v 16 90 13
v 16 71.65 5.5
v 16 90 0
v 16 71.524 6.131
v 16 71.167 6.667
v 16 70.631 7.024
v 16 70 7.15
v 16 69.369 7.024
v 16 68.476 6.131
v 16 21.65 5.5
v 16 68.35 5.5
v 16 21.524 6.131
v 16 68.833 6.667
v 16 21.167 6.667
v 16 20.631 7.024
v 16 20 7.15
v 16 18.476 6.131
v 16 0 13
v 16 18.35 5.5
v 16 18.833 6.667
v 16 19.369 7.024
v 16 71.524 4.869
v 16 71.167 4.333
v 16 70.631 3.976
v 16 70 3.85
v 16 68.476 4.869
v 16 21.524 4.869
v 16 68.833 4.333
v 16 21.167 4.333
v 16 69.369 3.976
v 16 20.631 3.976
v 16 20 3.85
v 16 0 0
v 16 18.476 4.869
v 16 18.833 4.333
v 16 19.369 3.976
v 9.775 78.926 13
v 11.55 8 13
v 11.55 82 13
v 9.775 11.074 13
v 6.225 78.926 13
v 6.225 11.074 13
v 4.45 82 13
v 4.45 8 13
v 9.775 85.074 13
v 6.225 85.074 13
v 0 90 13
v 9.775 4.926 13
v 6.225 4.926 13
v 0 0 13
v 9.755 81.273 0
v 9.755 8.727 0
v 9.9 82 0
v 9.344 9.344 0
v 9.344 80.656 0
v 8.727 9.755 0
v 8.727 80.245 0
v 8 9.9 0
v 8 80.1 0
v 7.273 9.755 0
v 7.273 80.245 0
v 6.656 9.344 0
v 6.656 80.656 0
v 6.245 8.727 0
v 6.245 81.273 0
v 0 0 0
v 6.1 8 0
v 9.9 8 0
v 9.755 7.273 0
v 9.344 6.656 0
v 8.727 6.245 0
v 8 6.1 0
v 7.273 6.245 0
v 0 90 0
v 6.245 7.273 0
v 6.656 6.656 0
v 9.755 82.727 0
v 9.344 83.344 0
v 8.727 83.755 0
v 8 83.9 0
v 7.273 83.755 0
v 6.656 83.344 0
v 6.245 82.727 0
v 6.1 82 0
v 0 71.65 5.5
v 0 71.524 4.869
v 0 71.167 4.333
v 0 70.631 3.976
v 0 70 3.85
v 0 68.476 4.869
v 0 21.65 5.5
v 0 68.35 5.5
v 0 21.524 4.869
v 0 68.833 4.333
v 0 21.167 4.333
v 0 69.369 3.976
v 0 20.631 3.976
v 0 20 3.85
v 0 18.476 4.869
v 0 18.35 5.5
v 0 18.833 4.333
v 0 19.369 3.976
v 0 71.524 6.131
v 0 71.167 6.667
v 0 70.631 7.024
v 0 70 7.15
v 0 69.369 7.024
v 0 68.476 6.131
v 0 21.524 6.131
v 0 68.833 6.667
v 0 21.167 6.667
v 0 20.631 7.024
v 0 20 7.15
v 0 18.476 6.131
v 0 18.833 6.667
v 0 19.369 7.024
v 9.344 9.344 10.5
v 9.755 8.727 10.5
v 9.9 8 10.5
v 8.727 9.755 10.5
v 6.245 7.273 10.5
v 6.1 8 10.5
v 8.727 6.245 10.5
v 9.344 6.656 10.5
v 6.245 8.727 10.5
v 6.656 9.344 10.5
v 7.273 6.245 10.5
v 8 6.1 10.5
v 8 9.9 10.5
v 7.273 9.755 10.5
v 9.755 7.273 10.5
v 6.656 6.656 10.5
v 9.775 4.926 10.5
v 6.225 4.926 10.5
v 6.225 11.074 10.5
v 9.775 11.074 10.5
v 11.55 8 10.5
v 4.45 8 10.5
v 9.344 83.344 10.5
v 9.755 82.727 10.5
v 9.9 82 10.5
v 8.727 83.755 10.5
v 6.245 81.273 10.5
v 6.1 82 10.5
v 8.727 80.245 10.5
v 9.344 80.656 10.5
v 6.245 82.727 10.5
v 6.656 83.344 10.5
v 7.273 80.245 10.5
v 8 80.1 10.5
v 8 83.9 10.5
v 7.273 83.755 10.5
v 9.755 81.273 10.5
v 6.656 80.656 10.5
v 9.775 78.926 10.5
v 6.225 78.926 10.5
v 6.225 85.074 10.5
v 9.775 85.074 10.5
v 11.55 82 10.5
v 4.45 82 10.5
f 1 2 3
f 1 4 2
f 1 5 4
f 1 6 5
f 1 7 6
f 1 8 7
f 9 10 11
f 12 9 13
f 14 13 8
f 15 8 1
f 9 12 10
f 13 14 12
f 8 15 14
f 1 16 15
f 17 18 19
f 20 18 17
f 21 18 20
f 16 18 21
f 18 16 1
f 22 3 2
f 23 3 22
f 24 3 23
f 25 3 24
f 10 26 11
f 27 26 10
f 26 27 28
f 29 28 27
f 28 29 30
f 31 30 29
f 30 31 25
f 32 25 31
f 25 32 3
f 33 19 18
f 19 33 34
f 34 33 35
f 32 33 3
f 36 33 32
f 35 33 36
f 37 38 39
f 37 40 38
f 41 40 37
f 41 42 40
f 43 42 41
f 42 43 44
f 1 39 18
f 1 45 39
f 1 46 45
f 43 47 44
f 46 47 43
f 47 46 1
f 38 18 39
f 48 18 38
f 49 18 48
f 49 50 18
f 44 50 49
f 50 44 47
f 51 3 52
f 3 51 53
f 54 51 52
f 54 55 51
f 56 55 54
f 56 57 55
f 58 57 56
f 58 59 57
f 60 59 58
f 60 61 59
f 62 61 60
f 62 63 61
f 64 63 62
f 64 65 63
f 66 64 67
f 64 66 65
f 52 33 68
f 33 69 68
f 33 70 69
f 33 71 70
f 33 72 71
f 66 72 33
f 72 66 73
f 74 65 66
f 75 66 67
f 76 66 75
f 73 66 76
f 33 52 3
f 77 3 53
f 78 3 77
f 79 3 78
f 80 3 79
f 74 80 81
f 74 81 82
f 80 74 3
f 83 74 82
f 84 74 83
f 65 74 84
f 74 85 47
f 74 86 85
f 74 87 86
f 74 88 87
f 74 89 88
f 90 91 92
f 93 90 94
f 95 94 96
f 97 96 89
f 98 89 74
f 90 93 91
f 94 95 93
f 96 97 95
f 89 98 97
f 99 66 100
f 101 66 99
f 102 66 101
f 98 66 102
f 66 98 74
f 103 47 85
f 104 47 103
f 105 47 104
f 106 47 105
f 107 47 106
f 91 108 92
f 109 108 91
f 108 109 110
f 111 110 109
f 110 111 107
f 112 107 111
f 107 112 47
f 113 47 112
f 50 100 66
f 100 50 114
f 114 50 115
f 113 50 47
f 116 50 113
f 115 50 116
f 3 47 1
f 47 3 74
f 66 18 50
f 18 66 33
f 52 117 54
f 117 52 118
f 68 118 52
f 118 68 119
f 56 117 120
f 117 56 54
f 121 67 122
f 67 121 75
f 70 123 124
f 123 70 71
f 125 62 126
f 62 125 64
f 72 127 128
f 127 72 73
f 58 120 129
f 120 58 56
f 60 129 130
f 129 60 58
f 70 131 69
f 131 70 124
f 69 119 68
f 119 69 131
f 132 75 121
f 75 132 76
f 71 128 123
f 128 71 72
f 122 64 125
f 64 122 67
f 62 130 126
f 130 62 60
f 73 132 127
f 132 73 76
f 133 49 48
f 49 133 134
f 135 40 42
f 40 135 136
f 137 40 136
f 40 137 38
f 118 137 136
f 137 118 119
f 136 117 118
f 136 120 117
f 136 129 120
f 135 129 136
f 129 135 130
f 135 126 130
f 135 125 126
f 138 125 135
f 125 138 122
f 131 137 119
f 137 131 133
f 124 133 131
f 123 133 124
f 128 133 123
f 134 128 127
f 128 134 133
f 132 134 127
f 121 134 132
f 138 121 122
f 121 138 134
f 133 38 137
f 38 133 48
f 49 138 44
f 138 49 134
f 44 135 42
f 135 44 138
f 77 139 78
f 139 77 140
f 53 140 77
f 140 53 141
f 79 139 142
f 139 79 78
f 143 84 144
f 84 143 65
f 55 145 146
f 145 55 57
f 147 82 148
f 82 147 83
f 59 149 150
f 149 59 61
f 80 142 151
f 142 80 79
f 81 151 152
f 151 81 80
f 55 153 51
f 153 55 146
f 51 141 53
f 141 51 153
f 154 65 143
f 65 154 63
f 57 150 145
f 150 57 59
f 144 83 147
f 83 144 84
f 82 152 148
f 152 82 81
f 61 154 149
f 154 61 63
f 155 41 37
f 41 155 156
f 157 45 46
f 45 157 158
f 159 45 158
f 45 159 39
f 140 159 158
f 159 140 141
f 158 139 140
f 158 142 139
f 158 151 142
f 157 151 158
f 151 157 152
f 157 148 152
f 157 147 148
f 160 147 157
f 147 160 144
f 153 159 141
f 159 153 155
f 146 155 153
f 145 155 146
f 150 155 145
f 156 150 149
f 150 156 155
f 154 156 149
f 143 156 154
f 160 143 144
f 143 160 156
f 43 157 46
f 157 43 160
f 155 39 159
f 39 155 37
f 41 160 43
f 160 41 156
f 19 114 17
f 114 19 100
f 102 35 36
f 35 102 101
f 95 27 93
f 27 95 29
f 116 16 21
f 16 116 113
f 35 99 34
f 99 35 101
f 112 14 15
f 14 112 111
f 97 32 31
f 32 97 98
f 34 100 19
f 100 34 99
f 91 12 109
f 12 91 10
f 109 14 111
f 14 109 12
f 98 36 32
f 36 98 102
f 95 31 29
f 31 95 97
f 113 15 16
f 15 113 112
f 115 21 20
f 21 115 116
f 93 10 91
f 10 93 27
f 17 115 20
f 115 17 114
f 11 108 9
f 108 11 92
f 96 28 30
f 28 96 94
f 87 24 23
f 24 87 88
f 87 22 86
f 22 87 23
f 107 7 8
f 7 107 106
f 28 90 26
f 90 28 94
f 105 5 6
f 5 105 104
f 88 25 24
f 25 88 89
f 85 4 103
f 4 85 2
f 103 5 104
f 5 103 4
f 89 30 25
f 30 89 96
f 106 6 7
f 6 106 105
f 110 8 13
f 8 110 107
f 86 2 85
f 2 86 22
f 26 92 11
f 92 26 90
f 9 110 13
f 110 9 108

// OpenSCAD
length=90;
width=16;
inset=8;
inset2=20;
recess=2;
m3clearH=3.3;
m3clearV=3.8;
m3nutV=7.1;
nutTrapHeight=2.5;
overlap=1;

difference() {
	cube([width,length,15-recess]);
	translate([width/2,inset,-1]) cylinder(r=m3clearV/2,h=15,$fn=16);
	translate([width/2,inset,15-recess-nutTrapHeight]) cylinder(r=m3nutV/2,h=15,$fn=6);
	translate([width/2,length-inset,-1]) cylinder(r=m3clearV/2,h=15,$fn=16);
	translate([width/2,length-inset,15-recess-nutTrapHeight]) cylinder(r=m3nutV/2,h=15,$fn=6);

	translate([-overlap,inset2,15/2-recess])
		rotate([0,90,0]) cylinder(r=m3clearH/2,h=width+2*overlap,$fn=16);
	translate([-overlap,length-inset2,15/2-recess])
		rotate([0,90,0]) cylinder(r=m3clearH/2,h=width+2*overlap,$fn=16);
}
